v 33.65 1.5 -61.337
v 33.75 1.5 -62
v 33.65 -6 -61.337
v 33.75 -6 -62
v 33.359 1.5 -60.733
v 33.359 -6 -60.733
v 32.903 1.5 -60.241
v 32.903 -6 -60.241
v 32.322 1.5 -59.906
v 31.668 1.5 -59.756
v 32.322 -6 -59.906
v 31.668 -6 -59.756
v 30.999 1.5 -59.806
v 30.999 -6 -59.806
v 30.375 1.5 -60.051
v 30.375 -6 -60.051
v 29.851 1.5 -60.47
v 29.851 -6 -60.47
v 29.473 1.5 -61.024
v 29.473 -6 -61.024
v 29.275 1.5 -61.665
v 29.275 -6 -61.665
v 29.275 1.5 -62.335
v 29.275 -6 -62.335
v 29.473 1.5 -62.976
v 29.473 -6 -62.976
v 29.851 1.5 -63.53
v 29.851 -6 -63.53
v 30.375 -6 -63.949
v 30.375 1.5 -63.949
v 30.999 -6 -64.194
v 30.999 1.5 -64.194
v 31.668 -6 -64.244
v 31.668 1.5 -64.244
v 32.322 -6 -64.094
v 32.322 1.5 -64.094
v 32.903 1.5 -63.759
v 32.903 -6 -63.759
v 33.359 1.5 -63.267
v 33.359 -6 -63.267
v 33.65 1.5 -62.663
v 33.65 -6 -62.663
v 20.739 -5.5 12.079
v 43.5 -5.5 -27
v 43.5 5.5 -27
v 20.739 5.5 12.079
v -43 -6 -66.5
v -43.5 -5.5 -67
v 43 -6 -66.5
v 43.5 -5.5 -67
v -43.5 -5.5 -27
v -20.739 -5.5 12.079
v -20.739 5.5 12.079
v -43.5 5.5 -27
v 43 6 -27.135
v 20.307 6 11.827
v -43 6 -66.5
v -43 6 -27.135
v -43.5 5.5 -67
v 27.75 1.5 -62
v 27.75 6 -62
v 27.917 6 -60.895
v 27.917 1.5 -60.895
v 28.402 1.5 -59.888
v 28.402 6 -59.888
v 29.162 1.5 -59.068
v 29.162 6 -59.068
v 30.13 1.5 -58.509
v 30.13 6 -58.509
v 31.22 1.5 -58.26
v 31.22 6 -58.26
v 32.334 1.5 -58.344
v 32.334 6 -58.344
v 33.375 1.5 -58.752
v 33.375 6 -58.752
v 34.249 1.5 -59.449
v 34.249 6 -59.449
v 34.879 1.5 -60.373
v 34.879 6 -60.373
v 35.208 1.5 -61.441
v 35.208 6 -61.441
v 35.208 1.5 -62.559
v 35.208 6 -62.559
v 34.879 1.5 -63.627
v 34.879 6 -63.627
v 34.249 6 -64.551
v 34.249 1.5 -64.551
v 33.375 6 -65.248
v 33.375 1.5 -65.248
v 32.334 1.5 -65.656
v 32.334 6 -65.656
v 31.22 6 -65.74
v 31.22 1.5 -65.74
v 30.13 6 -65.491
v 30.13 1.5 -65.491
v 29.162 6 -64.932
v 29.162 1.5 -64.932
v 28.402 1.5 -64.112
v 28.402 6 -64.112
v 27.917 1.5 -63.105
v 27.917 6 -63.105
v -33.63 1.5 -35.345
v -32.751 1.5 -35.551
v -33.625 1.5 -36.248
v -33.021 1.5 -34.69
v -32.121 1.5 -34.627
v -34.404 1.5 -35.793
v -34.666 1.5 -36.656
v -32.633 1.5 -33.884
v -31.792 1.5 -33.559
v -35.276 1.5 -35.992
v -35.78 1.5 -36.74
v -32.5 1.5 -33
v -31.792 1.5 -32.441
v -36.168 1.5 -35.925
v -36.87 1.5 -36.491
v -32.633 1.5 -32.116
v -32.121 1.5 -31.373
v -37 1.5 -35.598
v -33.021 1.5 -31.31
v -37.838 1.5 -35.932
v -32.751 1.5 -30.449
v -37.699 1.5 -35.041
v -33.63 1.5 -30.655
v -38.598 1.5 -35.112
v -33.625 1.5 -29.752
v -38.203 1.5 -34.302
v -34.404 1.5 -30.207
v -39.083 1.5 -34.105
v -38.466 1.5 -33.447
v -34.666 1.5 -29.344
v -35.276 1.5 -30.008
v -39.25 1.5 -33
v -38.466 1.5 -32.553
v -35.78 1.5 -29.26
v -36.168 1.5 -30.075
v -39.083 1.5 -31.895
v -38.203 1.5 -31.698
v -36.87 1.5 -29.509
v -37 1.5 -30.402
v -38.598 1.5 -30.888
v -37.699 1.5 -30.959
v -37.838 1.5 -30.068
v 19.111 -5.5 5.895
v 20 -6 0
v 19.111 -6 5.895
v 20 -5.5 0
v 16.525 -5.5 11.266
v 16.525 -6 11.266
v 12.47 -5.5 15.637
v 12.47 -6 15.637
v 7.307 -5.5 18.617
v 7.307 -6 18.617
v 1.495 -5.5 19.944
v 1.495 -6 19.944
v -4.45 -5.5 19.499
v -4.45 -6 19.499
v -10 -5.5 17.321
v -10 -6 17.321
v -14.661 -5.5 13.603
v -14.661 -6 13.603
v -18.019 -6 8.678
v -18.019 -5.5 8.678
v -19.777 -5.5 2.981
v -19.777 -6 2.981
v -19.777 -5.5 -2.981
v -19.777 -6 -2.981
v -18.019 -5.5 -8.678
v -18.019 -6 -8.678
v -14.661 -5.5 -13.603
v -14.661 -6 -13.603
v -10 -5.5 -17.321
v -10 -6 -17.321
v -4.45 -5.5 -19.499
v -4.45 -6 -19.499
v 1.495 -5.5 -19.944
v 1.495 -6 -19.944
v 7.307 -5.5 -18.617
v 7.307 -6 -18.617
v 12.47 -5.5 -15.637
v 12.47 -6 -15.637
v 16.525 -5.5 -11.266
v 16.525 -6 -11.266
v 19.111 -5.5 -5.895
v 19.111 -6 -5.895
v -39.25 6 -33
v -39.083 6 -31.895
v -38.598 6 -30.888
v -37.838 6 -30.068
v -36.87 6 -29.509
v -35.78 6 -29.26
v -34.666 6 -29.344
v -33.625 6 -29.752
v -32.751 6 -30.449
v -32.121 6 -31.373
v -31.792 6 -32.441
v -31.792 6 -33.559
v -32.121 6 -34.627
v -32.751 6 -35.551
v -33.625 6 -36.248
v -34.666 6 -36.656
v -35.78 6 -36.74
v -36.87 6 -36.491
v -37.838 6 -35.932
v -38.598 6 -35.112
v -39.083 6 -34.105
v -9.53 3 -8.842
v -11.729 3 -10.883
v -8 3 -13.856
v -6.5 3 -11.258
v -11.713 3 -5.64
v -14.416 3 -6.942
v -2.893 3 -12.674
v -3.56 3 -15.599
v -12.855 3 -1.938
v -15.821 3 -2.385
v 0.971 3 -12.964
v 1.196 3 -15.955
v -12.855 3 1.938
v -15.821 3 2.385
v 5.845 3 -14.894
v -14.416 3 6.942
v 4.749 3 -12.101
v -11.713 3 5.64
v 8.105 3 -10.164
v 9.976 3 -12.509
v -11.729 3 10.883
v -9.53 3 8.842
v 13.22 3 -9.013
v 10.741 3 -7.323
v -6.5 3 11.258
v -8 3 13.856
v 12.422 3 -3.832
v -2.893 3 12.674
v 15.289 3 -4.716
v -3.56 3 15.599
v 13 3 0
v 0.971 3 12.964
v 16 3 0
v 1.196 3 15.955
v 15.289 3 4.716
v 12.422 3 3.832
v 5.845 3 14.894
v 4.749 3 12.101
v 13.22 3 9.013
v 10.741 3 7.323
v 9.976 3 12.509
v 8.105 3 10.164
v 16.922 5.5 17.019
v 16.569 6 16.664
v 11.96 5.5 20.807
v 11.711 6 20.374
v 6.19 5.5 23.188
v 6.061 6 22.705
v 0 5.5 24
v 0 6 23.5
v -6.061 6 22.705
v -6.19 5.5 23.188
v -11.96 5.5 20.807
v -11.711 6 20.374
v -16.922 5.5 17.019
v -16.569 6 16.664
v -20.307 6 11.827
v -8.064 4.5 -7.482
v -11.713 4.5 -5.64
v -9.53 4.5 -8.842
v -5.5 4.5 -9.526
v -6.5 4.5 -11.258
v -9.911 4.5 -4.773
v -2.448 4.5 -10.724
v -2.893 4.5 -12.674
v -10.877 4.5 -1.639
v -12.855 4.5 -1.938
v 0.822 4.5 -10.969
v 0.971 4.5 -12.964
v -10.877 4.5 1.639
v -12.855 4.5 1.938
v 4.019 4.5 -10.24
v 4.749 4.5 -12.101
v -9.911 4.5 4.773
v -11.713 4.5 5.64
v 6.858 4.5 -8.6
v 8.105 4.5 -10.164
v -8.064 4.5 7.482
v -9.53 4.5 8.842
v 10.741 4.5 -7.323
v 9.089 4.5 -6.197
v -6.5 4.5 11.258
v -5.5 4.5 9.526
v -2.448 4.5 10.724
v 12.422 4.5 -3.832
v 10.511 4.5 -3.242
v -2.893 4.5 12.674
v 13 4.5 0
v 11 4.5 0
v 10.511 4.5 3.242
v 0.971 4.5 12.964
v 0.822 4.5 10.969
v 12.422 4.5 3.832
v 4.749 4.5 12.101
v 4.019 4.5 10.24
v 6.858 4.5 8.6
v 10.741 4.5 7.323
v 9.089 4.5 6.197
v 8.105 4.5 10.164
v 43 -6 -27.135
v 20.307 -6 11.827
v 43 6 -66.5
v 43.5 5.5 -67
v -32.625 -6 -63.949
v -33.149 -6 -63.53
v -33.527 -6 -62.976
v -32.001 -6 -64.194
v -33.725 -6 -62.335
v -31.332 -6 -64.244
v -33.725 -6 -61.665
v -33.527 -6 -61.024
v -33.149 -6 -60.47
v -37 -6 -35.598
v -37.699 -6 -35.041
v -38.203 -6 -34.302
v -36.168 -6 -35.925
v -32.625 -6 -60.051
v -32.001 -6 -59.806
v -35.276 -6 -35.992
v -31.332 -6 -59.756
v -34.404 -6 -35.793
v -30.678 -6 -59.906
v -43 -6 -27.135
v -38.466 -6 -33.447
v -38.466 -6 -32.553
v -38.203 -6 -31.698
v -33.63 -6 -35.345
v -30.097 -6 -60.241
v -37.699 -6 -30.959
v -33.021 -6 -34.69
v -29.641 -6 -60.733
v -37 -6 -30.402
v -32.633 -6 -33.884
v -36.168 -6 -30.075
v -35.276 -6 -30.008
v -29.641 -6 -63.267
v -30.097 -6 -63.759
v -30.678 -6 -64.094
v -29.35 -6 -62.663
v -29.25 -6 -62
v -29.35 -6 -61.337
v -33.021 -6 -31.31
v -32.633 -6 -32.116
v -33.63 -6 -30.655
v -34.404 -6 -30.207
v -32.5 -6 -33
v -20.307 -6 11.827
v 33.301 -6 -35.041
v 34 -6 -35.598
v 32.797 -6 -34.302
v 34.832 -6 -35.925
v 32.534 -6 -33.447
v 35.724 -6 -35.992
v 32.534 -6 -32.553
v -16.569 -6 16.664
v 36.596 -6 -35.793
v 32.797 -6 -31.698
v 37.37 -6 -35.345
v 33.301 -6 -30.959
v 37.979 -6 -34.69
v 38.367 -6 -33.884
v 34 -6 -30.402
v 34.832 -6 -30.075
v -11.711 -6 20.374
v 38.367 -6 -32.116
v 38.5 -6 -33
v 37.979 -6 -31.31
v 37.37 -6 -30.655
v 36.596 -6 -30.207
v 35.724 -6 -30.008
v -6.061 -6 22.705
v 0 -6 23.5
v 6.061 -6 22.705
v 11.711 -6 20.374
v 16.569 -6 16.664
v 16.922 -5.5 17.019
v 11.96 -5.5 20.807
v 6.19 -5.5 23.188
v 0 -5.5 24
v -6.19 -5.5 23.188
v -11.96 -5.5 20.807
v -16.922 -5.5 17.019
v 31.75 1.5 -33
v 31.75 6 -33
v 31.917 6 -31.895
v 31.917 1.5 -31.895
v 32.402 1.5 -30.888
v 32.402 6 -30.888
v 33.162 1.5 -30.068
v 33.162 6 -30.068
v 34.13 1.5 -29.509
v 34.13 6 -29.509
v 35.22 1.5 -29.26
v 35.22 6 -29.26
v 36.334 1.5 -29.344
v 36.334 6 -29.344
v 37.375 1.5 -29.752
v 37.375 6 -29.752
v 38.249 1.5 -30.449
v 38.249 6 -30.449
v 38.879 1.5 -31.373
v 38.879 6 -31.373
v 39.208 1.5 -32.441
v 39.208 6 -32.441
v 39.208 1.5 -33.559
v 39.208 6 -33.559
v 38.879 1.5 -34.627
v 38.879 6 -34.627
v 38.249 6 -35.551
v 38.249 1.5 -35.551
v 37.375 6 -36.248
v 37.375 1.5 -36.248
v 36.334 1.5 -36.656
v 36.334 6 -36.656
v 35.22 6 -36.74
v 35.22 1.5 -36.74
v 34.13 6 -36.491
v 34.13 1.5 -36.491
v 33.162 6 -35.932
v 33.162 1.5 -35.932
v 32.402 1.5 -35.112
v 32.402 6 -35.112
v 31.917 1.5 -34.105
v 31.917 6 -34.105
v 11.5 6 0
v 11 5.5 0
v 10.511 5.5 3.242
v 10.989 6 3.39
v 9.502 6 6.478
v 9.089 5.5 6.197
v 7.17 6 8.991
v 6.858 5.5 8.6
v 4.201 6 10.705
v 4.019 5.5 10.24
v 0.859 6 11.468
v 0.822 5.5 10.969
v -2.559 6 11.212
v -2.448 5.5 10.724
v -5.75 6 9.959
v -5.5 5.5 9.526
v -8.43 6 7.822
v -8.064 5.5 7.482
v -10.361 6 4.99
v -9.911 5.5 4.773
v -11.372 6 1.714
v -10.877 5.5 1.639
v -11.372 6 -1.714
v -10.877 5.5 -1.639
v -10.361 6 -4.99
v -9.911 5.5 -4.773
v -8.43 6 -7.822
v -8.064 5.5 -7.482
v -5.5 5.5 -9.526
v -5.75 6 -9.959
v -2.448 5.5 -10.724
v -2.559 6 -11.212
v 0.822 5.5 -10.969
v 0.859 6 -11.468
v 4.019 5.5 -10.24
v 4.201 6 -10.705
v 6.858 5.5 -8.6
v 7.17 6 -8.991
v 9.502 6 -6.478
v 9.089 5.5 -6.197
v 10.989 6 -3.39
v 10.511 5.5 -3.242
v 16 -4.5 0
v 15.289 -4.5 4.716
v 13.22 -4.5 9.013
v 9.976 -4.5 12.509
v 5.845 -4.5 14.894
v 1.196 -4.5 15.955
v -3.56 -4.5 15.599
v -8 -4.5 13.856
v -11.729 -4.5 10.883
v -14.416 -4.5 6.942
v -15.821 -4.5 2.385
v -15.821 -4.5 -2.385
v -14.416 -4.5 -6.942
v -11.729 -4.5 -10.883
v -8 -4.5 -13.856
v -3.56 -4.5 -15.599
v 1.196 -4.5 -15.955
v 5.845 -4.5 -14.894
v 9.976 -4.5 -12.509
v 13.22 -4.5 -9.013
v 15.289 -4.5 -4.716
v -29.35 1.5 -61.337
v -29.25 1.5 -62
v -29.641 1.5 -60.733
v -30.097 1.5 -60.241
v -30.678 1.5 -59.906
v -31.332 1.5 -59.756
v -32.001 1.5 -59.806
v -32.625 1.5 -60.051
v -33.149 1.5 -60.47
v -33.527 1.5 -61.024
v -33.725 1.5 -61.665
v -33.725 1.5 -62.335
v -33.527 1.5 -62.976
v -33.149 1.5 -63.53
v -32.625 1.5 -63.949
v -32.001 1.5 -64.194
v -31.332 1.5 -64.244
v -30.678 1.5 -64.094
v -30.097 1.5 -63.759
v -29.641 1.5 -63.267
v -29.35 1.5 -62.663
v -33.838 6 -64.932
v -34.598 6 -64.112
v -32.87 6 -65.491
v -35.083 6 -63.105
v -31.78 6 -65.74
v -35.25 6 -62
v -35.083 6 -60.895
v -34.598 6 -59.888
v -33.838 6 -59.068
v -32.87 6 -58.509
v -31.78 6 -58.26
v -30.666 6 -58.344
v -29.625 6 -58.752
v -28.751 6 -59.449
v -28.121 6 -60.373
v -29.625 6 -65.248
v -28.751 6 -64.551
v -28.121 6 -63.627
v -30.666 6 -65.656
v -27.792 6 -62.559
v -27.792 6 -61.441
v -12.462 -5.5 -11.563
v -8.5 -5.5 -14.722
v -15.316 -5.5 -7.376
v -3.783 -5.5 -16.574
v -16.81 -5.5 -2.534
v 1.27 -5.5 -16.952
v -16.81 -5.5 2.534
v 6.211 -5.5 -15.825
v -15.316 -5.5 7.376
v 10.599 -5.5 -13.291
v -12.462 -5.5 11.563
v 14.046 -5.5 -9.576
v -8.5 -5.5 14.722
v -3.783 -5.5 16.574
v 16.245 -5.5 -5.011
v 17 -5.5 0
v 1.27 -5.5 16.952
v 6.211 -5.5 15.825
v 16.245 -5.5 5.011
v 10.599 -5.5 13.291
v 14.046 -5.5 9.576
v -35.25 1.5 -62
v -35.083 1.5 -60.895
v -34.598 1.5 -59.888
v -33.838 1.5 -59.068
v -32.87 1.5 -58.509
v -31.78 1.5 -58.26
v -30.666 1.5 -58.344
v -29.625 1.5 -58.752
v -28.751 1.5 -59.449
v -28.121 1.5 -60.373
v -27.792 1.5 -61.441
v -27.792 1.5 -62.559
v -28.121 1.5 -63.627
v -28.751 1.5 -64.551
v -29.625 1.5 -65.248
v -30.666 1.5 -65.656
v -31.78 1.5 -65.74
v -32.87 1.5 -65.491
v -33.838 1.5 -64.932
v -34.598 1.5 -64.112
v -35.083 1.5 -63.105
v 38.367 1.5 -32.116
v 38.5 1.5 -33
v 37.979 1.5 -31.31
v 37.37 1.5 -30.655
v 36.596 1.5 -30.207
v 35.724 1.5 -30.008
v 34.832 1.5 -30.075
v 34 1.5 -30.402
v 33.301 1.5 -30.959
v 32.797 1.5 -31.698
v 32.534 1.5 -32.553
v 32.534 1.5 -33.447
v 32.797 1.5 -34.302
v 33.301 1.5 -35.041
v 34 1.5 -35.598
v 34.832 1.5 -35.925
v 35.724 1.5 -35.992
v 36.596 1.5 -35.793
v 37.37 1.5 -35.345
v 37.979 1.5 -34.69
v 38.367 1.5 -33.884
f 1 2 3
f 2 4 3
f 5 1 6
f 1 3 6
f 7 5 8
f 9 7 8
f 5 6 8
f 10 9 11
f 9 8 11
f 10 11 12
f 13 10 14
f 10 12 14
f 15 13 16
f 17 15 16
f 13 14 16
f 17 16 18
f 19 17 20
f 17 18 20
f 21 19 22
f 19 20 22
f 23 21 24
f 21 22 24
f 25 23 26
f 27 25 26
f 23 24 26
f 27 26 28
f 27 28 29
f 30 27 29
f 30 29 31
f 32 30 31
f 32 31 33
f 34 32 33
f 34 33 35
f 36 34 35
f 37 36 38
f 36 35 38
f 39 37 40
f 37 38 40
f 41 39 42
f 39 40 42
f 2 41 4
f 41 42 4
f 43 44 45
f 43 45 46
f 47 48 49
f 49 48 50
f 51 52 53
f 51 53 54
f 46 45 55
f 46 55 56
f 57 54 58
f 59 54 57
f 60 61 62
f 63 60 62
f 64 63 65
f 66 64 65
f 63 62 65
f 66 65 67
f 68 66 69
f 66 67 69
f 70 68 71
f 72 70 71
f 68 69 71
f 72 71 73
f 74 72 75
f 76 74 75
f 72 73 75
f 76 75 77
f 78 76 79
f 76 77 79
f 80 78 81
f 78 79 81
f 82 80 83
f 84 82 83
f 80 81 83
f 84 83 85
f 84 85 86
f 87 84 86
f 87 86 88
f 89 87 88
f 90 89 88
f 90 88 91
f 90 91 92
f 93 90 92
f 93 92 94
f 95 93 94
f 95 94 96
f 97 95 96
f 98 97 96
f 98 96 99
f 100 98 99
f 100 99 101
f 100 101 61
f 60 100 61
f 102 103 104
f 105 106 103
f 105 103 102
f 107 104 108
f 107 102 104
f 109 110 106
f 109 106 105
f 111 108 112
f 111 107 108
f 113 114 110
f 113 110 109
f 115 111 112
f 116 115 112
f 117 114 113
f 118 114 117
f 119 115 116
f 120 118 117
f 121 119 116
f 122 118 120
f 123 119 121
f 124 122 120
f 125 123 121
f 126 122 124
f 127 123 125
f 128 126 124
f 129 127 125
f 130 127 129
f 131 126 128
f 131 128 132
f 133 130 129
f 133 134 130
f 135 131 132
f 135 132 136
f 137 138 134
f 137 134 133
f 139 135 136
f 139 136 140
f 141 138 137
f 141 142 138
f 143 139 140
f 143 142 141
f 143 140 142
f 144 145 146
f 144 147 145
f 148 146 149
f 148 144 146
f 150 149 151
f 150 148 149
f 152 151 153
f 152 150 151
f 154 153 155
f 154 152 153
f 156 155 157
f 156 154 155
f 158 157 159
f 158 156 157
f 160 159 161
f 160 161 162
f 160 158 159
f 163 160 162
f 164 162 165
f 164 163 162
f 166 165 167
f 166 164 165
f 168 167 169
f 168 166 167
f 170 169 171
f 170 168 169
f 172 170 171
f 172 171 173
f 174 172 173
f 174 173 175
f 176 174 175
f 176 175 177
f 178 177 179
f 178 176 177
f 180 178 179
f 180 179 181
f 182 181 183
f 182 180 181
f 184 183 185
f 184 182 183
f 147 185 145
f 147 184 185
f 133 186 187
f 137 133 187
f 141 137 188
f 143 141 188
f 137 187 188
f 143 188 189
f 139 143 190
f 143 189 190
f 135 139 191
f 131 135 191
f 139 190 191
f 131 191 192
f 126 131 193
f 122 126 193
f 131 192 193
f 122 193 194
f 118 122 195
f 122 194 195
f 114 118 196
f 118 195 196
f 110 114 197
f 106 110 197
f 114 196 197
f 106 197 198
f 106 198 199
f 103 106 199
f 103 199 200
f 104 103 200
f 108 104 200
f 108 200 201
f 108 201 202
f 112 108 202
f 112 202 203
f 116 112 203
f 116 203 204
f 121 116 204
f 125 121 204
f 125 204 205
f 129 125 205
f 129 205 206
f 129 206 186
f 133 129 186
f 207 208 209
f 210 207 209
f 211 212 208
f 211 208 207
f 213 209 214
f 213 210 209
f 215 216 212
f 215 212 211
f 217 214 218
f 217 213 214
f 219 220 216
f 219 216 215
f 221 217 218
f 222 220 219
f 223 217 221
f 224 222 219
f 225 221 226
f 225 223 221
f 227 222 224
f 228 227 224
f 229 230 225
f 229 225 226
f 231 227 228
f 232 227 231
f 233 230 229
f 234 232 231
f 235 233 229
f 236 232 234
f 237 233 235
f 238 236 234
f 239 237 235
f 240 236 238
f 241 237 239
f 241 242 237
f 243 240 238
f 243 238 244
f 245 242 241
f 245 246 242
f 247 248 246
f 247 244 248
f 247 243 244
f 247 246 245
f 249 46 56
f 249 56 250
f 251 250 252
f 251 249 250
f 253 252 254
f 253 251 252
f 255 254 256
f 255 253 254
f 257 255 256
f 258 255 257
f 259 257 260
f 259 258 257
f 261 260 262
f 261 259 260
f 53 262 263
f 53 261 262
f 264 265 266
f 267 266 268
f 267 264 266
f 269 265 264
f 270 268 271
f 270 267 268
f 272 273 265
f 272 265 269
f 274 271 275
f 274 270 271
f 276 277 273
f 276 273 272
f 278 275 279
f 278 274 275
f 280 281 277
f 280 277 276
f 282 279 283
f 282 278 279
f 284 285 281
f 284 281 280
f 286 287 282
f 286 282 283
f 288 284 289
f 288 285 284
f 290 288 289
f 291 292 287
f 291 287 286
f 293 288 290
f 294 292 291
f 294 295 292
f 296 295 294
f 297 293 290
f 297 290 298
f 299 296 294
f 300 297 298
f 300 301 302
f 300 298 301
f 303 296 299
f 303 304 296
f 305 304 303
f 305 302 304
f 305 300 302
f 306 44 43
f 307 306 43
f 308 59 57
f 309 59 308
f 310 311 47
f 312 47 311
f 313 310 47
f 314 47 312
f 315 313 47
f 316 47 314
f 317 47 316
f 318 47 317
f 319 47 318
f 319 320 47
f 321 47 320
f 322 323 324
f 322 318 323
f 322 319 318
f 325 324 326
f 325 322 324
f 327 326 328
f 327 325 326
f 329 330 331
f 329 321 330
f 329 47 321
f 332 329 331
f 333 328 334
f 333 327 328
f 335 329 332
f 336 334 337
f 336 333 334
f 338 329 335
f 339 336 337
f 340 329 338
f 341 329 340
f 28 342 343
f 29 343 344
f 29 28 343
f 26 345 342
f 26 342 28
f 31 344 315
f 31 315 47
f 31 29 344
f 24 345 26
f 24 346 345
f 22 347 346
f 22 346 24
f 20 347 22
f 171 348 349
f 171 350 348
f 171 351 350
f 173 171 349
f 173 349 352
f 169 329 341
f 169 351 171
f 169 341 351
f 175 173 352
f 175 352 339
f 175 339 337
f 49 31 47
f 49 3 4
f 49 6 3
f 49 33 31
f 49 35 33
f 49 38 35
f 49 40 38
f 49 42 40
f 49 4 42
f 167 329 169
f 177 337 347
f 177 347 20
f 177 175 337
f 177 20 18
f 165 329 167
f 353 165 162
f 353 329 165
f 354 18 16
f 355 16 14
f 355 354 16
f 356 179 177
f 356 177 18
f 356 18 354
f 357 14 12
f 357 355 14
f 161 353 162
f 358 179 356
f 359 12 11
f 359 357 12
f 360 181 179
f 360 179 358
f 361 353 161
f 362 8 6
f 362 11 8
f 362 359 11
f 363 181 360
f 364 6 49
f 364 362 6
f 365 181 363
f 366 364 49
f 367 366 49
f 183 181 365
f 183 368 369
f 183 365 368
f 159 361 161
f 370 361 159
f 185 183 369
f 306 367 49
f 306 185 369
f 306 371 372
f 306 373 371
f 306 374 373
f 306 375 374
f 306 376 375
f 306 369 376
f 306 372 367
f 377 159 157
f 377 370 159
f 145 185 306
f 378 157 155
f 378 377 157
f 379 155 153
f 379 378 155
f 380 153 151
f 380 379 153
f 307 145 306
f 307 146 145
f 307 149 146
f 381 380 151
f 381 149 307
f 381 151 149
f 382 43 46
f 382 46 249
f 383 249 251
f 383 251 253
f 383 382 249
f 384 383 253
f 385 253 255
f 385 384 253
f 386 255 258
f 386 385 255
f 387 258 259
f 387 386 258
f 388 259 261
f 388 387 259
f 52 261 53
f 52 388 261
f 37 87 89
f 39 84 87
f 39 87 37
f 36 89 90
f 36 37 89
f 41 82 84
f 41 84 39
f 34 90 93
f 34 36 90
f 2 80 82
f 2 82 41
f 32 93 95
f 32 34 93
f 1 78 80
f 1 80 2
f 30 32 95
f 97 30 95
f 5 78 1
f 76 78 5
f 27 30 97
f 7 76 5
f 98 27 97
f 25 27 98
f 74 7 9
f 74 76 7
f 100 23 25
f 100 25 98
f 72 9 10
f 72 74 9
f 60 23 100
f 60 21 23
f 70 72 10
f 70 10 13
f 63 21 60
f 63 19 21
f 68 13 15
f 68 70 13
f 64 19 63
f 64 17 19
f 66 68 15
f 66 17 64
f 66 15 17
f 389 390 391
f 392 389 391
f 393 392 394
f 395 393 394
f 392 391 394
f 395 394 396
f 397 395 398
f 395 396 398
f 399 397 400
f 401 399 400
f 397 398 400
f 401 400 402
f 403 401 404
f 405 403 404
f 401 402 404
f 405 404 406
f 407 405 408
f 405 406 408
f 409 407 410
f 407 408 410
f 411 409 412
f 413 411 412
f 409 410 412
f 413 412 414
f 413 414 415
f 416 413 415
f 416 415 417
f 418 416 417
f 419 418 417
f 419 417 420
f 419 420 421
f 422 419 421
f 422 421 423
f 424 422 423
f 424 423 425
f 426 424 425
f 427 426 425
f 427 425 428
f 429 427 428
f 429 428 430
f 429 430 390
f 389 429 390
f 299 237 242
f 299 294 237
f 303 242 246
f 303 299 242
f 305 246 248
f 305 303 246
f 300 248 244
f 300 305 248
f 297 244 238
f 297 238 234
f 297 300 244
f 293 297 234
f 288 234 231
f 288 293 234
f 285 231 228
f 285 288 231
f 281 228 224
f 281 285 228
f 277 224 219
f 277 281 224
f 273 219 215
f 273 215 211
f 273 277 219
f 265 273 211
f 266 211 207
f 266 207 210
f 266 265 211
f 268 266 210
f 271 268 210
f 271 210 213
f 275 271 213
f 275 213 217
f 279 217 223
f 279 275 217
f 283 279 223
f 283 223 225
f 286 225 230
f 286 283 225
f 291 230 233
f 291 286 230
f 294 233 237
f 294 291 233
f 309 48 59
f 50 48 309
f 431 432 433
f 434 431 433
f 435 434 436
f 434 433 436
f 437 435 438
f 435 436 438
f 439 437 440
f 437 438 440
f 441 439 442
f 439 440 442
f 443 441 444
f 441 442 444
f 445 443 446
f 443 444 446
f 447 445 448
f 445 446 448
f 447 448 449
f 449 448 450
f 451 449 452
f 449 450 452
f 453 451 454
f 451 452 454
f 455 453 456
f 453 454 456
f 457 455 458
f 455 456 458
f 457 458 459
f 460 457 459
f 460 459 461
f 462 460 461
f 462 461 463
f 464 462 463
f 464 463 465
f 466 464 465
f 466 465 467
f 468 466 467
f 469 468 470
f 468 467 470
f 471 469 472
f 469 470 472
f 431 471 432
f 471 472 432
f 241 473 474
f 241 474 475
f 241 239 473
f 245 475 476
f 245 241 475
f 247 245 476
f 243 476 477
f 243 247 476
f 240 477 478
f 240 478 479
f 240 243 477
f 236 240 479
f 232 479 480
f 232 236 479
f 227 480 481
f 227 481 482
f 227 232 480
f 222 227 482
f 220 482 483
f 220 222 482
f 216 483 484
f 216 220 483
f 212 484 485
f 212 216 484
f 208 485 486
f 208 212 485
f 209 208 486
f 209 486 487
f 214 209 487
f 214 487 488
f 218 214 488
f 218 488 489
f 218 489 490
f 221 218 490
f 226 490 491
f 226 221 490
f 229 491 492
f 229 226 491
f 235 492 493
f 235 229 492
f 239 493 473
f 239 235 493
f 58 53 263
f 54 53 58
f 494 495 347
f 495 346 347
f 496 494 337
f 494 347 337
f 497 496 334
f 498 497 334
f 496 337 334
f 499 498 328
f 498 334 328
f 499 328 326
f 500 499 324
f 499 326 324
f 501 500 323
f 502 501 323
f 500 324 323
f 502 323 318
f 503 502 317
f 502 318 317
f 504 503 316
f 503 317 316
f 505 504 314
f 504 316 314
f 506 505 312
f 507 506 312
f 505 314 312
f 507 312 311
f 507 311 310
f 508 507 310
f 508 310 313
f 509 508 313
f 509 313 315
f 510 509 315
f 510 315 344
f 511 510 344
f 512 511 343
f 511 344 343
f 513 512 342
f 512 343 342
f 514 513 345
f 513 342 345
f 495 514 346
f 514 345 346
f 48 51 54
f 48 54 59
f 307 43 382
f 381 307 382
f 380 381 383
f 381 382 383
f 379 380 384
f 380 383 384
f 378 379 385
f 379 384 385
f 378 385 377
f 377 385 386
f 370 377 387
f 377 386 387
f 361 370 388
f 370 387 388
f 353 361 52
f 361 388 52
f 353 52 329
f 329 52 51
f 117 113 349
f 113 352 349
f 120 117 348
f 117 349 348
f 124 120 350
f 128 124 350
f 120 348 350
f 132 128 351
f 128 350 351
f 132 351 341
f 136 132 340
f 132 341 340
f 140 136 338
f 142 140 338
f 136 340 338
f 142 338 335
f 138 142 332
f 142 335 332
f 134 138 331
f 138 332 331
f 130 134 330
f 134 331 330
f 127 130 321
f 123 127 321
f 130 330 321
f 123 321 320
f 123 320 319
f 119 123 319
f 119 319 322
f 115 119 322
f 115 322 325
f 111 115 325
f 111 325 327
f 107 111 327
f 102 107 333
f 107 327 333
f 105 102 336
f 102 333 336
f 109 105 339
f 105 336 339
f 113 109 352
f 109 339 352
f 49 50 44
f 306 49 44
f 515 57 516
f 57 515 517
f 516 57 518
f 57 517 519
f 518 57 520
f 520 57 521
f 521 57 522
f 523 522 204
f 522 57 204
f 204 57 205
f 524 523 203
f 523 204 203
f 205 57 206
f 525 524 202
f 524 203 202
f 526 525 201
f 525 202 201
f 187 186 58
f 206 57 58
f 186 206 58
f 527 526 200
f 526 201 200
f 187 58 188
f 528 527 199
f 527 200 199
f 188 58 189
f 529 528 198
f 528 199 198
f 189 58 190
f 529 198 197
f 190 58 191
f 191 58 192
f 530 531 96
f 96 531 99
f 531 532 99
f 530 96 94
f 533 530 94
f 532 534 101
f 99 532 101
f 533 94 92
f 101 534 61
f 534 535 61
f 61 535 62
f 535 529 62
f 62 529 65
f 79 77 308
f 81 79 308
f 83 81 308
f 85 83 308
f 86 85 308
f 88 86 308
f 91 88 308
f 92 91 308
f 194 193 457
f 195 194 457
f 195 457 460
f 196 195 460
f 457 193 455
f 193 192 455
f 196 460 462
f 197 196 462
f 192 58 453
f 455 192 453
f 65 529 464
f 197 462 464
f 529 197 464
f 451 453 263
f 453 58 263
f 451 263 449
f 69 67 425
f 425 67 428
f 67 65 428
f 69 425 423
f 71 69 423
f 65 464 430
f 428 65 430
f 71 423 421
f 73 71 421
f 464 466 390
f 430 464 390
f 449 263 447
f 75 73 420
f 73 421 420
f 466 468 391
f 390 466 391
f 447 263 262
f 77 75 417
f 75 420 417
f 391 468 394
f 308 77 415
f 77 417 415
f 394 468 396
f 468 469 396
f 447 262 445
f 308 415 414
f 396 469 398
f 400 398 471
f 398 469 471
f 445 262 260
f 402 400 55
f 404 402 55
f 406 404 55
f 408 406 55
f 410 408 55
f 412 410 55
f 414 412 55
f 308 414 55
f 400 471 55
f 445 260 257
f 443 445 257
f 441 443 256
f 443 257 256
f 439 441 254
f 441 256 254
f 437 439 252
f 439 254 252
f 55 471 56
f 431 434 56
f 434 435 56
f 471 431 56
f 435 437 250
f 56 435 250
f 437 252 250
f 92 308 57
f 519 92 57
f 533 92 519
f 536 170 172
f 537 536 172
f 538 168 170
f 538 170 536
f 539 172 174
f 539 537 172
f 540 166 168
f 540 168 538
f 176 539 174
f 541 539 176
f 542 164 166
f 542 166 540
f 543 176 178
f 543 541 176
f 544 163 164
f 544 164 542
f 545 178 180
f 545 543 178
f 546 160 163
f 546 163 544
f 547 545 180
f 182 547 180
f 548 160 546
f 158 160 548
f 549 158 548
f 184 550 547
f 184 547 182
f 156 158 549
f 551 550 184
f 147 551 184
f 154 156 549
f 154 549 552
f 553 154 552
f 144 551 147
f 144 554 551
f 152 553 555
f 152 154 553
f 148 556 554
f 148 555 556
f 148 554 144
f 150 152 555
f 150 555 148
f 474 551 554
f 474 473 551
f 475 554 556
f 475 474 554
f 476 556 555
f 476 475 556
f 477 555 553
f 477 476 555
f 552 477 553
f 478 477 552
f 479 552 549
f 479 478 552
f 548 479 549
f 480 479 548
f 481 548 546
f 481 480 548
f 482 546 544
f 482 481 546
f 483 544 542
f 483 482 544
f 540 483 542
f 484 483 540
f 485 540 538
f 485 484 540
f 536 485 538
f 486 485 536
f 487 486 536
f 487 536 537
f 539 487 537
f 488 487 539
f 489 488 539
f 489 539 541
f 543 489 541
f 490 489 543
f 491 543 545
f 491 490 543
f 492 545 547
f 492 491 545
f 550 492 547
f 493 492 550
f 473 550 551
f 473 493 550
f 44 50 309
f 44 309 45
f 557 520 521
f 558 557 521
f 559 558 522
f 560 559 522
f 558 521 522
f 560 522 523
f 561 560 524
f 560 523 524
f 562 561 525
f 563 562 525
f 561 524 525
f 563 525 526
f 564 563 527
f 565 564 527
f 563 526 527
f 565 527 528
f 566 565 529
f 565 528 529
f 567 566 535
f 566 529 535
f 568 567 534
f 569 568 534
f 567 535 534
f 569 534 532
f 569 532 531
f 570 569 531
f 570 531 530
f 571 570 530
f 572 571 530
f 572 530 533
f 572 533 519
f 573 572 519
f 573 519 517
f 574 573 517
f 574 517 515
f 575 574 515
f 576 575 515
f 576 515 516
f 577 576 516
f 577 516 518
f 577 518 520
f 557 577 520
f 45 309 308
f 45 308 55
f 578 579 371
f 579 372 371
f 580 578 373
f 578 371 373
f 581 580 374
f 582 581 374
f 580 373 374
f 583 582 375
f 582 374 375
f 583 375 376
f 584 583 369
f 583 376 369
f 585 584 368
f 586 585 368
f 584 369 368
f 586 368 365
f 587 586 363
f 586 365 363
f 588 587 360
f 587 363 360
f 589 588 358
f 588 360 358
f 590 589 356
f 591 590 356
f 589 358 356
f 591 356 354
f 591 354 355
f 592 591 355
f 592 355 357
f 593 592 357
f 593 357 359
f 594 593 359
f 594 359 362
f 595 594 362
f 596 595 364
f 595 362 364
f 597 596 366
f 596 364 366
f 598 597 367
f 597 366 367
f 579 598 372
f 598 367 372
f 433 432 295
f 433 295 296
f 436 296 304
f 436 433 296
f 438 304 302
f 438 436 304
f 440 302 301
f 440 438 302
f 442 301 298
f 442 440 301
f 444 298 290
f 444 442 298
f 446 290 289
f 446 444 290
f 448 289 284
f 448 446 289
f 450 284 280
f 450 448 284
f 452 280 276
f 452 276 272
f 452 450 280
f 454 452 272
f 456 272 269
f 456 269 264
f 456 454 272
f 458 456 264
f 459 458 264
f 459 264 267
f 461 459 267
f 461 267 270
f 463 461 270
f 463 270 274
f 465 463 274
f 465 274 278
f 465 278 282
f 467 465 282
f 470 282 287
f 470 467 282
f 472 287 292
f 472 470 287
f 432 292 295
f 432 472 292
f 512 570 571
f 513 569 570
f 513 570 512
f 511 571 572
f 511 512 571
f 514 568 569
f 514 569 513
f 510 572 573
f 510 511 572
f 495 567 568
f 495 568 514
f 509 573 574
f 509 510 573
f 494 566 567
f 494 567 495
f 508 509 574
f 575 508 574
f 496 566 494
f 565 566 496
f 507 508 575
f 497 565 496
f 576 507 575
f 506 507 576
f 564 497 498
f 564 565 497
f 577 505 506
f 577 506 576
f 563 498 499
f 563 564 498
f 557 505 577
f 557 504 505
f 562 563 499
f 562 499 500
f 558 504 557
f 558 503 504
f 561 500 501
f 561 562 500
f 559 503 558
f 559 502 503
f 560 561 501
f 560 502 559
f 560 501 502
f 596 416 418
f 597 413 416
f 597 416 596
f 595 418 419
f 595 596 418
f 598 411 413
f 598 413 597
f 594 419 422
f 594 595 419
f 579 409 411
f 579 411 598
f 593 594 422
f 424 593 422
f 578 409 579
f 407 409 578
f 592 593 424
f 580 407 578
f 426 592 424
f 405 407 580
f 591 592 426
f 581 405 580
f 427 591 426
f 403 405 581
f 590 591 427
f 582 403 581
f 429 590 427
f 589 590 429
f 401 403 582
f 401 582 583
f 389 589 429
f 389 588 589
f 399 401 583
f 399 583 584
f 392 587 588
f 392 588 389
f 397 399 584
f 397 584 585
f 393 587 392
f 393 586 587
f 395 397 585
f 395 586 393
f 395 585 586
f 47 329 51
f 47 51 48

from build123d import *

# Parameters (mm, degrees)
F0_R           = 11
F1_DEPTH       = 6
F3_D           = 6
F3_DEPTH       = 18
F3_CBORE_D     = 7.5
F3_CBORE_DEPTH = 4.5
F4_D           = 4.5
F4_DEPTH       = 18
F4_CBORE_D     = 7.5
F4_CBORE_DEPTH = 4.5
F5_W           = 11
F5_H           = 1.5
F7_SIZE        = 0.5


with BuildPart() as f1:
    # F0 (on Front) → F1 (new body, symmetric)
    with BuildSketch(Plane.XZ):
        with BuildLine():
            Line((-20.738746, 12.07909), (-43.5, -27))
            Line((-43.5, -27), (-43.5, -67))
            Line((-43.5, -67), (43.5, -67))
            Line((43.5, -67), (43.5, -27))
            Line((43.5, -27), (20.738746, 12.07909))
            ThreePointArc((20.738746, 12.07909), (0, 24), (-20.738746, 12.07909))
        make_face()
        Circle(F0_R, mode=Mode.SUBTRACT)
    extrude(amount=F1_DEPTH, both=True)

    # F3
    with Locations(Plane(origin=(0, 6, 0), x_dir=(-1, 0, 0), z_dir=(0, 1, 0))):
        with Locations((-35.5, -33), (35.5, -33)):
            CounterBoreHole(F3_D / 2, F3_CBORE_D / 2, F3_CBORE_DEPTH, depth=F3_DEPTH)

    # F4
    with Locations(Plane(origin=(0, 6, 0), x_dir=(-1, 0, 0), z_dir=(0, 1, 0))):
        with Locations((-31.5, -62), (31.5, -62)):
            CounterBoreHole(F4_D / 2, F4_CBORE_D / 2, F4_CBORE_DEPTH, depth=F4_DEPTH)

    # F5 (on Top) → F6 (revolve, cut)
    with BuildSketch(Plane.XY):
        with Locations((5.5, 5.25)):
            Rectangle(F5_W, F5_H)
        Polygon((13, 4.5), (11, 4.5), (0, 4.5), (0, 3), (13, 3), align=None)
        Polygon((13, 3), (0, 3), (0, -4.5), (16, -4.5), (16, 3), align=None)
        Polygon((16, -4.5), (0, -4.5), (0, -5.5), (17, -5.5), align=None)
        Polygon((17, -5.5), (0, -5.5), (0, -6), (20, -6), (20, -5.5), align=None)
    revolve(axis=Axis((0, 3.886208, 0), (0, -1, 0)), mode=Mode.SUBTRACT)

    # F7
    f7_edges = [f1.edges().sort_by_distance(p)[0] for p in [
        (-11, 6, 0),
        (32.119373, 6, -7.460455),
        (0, 6, 24),
        (43.5, 6, -47),
        (0, 6, -67),
        (-43.5, 6, -47),
        (-32.119373, 6, -7.460455),
        (0, -6, 24),
        (32.119373, -6, -7.460455),
        (-32.119373, -6, -7.460455),
        (-43.5, -6, -47),
        (43.5, -6, -47),
        (0, -6, -67),
    ]]
    chamfer(f7_edges, length=F7_SIZE)


solid = f1.part
